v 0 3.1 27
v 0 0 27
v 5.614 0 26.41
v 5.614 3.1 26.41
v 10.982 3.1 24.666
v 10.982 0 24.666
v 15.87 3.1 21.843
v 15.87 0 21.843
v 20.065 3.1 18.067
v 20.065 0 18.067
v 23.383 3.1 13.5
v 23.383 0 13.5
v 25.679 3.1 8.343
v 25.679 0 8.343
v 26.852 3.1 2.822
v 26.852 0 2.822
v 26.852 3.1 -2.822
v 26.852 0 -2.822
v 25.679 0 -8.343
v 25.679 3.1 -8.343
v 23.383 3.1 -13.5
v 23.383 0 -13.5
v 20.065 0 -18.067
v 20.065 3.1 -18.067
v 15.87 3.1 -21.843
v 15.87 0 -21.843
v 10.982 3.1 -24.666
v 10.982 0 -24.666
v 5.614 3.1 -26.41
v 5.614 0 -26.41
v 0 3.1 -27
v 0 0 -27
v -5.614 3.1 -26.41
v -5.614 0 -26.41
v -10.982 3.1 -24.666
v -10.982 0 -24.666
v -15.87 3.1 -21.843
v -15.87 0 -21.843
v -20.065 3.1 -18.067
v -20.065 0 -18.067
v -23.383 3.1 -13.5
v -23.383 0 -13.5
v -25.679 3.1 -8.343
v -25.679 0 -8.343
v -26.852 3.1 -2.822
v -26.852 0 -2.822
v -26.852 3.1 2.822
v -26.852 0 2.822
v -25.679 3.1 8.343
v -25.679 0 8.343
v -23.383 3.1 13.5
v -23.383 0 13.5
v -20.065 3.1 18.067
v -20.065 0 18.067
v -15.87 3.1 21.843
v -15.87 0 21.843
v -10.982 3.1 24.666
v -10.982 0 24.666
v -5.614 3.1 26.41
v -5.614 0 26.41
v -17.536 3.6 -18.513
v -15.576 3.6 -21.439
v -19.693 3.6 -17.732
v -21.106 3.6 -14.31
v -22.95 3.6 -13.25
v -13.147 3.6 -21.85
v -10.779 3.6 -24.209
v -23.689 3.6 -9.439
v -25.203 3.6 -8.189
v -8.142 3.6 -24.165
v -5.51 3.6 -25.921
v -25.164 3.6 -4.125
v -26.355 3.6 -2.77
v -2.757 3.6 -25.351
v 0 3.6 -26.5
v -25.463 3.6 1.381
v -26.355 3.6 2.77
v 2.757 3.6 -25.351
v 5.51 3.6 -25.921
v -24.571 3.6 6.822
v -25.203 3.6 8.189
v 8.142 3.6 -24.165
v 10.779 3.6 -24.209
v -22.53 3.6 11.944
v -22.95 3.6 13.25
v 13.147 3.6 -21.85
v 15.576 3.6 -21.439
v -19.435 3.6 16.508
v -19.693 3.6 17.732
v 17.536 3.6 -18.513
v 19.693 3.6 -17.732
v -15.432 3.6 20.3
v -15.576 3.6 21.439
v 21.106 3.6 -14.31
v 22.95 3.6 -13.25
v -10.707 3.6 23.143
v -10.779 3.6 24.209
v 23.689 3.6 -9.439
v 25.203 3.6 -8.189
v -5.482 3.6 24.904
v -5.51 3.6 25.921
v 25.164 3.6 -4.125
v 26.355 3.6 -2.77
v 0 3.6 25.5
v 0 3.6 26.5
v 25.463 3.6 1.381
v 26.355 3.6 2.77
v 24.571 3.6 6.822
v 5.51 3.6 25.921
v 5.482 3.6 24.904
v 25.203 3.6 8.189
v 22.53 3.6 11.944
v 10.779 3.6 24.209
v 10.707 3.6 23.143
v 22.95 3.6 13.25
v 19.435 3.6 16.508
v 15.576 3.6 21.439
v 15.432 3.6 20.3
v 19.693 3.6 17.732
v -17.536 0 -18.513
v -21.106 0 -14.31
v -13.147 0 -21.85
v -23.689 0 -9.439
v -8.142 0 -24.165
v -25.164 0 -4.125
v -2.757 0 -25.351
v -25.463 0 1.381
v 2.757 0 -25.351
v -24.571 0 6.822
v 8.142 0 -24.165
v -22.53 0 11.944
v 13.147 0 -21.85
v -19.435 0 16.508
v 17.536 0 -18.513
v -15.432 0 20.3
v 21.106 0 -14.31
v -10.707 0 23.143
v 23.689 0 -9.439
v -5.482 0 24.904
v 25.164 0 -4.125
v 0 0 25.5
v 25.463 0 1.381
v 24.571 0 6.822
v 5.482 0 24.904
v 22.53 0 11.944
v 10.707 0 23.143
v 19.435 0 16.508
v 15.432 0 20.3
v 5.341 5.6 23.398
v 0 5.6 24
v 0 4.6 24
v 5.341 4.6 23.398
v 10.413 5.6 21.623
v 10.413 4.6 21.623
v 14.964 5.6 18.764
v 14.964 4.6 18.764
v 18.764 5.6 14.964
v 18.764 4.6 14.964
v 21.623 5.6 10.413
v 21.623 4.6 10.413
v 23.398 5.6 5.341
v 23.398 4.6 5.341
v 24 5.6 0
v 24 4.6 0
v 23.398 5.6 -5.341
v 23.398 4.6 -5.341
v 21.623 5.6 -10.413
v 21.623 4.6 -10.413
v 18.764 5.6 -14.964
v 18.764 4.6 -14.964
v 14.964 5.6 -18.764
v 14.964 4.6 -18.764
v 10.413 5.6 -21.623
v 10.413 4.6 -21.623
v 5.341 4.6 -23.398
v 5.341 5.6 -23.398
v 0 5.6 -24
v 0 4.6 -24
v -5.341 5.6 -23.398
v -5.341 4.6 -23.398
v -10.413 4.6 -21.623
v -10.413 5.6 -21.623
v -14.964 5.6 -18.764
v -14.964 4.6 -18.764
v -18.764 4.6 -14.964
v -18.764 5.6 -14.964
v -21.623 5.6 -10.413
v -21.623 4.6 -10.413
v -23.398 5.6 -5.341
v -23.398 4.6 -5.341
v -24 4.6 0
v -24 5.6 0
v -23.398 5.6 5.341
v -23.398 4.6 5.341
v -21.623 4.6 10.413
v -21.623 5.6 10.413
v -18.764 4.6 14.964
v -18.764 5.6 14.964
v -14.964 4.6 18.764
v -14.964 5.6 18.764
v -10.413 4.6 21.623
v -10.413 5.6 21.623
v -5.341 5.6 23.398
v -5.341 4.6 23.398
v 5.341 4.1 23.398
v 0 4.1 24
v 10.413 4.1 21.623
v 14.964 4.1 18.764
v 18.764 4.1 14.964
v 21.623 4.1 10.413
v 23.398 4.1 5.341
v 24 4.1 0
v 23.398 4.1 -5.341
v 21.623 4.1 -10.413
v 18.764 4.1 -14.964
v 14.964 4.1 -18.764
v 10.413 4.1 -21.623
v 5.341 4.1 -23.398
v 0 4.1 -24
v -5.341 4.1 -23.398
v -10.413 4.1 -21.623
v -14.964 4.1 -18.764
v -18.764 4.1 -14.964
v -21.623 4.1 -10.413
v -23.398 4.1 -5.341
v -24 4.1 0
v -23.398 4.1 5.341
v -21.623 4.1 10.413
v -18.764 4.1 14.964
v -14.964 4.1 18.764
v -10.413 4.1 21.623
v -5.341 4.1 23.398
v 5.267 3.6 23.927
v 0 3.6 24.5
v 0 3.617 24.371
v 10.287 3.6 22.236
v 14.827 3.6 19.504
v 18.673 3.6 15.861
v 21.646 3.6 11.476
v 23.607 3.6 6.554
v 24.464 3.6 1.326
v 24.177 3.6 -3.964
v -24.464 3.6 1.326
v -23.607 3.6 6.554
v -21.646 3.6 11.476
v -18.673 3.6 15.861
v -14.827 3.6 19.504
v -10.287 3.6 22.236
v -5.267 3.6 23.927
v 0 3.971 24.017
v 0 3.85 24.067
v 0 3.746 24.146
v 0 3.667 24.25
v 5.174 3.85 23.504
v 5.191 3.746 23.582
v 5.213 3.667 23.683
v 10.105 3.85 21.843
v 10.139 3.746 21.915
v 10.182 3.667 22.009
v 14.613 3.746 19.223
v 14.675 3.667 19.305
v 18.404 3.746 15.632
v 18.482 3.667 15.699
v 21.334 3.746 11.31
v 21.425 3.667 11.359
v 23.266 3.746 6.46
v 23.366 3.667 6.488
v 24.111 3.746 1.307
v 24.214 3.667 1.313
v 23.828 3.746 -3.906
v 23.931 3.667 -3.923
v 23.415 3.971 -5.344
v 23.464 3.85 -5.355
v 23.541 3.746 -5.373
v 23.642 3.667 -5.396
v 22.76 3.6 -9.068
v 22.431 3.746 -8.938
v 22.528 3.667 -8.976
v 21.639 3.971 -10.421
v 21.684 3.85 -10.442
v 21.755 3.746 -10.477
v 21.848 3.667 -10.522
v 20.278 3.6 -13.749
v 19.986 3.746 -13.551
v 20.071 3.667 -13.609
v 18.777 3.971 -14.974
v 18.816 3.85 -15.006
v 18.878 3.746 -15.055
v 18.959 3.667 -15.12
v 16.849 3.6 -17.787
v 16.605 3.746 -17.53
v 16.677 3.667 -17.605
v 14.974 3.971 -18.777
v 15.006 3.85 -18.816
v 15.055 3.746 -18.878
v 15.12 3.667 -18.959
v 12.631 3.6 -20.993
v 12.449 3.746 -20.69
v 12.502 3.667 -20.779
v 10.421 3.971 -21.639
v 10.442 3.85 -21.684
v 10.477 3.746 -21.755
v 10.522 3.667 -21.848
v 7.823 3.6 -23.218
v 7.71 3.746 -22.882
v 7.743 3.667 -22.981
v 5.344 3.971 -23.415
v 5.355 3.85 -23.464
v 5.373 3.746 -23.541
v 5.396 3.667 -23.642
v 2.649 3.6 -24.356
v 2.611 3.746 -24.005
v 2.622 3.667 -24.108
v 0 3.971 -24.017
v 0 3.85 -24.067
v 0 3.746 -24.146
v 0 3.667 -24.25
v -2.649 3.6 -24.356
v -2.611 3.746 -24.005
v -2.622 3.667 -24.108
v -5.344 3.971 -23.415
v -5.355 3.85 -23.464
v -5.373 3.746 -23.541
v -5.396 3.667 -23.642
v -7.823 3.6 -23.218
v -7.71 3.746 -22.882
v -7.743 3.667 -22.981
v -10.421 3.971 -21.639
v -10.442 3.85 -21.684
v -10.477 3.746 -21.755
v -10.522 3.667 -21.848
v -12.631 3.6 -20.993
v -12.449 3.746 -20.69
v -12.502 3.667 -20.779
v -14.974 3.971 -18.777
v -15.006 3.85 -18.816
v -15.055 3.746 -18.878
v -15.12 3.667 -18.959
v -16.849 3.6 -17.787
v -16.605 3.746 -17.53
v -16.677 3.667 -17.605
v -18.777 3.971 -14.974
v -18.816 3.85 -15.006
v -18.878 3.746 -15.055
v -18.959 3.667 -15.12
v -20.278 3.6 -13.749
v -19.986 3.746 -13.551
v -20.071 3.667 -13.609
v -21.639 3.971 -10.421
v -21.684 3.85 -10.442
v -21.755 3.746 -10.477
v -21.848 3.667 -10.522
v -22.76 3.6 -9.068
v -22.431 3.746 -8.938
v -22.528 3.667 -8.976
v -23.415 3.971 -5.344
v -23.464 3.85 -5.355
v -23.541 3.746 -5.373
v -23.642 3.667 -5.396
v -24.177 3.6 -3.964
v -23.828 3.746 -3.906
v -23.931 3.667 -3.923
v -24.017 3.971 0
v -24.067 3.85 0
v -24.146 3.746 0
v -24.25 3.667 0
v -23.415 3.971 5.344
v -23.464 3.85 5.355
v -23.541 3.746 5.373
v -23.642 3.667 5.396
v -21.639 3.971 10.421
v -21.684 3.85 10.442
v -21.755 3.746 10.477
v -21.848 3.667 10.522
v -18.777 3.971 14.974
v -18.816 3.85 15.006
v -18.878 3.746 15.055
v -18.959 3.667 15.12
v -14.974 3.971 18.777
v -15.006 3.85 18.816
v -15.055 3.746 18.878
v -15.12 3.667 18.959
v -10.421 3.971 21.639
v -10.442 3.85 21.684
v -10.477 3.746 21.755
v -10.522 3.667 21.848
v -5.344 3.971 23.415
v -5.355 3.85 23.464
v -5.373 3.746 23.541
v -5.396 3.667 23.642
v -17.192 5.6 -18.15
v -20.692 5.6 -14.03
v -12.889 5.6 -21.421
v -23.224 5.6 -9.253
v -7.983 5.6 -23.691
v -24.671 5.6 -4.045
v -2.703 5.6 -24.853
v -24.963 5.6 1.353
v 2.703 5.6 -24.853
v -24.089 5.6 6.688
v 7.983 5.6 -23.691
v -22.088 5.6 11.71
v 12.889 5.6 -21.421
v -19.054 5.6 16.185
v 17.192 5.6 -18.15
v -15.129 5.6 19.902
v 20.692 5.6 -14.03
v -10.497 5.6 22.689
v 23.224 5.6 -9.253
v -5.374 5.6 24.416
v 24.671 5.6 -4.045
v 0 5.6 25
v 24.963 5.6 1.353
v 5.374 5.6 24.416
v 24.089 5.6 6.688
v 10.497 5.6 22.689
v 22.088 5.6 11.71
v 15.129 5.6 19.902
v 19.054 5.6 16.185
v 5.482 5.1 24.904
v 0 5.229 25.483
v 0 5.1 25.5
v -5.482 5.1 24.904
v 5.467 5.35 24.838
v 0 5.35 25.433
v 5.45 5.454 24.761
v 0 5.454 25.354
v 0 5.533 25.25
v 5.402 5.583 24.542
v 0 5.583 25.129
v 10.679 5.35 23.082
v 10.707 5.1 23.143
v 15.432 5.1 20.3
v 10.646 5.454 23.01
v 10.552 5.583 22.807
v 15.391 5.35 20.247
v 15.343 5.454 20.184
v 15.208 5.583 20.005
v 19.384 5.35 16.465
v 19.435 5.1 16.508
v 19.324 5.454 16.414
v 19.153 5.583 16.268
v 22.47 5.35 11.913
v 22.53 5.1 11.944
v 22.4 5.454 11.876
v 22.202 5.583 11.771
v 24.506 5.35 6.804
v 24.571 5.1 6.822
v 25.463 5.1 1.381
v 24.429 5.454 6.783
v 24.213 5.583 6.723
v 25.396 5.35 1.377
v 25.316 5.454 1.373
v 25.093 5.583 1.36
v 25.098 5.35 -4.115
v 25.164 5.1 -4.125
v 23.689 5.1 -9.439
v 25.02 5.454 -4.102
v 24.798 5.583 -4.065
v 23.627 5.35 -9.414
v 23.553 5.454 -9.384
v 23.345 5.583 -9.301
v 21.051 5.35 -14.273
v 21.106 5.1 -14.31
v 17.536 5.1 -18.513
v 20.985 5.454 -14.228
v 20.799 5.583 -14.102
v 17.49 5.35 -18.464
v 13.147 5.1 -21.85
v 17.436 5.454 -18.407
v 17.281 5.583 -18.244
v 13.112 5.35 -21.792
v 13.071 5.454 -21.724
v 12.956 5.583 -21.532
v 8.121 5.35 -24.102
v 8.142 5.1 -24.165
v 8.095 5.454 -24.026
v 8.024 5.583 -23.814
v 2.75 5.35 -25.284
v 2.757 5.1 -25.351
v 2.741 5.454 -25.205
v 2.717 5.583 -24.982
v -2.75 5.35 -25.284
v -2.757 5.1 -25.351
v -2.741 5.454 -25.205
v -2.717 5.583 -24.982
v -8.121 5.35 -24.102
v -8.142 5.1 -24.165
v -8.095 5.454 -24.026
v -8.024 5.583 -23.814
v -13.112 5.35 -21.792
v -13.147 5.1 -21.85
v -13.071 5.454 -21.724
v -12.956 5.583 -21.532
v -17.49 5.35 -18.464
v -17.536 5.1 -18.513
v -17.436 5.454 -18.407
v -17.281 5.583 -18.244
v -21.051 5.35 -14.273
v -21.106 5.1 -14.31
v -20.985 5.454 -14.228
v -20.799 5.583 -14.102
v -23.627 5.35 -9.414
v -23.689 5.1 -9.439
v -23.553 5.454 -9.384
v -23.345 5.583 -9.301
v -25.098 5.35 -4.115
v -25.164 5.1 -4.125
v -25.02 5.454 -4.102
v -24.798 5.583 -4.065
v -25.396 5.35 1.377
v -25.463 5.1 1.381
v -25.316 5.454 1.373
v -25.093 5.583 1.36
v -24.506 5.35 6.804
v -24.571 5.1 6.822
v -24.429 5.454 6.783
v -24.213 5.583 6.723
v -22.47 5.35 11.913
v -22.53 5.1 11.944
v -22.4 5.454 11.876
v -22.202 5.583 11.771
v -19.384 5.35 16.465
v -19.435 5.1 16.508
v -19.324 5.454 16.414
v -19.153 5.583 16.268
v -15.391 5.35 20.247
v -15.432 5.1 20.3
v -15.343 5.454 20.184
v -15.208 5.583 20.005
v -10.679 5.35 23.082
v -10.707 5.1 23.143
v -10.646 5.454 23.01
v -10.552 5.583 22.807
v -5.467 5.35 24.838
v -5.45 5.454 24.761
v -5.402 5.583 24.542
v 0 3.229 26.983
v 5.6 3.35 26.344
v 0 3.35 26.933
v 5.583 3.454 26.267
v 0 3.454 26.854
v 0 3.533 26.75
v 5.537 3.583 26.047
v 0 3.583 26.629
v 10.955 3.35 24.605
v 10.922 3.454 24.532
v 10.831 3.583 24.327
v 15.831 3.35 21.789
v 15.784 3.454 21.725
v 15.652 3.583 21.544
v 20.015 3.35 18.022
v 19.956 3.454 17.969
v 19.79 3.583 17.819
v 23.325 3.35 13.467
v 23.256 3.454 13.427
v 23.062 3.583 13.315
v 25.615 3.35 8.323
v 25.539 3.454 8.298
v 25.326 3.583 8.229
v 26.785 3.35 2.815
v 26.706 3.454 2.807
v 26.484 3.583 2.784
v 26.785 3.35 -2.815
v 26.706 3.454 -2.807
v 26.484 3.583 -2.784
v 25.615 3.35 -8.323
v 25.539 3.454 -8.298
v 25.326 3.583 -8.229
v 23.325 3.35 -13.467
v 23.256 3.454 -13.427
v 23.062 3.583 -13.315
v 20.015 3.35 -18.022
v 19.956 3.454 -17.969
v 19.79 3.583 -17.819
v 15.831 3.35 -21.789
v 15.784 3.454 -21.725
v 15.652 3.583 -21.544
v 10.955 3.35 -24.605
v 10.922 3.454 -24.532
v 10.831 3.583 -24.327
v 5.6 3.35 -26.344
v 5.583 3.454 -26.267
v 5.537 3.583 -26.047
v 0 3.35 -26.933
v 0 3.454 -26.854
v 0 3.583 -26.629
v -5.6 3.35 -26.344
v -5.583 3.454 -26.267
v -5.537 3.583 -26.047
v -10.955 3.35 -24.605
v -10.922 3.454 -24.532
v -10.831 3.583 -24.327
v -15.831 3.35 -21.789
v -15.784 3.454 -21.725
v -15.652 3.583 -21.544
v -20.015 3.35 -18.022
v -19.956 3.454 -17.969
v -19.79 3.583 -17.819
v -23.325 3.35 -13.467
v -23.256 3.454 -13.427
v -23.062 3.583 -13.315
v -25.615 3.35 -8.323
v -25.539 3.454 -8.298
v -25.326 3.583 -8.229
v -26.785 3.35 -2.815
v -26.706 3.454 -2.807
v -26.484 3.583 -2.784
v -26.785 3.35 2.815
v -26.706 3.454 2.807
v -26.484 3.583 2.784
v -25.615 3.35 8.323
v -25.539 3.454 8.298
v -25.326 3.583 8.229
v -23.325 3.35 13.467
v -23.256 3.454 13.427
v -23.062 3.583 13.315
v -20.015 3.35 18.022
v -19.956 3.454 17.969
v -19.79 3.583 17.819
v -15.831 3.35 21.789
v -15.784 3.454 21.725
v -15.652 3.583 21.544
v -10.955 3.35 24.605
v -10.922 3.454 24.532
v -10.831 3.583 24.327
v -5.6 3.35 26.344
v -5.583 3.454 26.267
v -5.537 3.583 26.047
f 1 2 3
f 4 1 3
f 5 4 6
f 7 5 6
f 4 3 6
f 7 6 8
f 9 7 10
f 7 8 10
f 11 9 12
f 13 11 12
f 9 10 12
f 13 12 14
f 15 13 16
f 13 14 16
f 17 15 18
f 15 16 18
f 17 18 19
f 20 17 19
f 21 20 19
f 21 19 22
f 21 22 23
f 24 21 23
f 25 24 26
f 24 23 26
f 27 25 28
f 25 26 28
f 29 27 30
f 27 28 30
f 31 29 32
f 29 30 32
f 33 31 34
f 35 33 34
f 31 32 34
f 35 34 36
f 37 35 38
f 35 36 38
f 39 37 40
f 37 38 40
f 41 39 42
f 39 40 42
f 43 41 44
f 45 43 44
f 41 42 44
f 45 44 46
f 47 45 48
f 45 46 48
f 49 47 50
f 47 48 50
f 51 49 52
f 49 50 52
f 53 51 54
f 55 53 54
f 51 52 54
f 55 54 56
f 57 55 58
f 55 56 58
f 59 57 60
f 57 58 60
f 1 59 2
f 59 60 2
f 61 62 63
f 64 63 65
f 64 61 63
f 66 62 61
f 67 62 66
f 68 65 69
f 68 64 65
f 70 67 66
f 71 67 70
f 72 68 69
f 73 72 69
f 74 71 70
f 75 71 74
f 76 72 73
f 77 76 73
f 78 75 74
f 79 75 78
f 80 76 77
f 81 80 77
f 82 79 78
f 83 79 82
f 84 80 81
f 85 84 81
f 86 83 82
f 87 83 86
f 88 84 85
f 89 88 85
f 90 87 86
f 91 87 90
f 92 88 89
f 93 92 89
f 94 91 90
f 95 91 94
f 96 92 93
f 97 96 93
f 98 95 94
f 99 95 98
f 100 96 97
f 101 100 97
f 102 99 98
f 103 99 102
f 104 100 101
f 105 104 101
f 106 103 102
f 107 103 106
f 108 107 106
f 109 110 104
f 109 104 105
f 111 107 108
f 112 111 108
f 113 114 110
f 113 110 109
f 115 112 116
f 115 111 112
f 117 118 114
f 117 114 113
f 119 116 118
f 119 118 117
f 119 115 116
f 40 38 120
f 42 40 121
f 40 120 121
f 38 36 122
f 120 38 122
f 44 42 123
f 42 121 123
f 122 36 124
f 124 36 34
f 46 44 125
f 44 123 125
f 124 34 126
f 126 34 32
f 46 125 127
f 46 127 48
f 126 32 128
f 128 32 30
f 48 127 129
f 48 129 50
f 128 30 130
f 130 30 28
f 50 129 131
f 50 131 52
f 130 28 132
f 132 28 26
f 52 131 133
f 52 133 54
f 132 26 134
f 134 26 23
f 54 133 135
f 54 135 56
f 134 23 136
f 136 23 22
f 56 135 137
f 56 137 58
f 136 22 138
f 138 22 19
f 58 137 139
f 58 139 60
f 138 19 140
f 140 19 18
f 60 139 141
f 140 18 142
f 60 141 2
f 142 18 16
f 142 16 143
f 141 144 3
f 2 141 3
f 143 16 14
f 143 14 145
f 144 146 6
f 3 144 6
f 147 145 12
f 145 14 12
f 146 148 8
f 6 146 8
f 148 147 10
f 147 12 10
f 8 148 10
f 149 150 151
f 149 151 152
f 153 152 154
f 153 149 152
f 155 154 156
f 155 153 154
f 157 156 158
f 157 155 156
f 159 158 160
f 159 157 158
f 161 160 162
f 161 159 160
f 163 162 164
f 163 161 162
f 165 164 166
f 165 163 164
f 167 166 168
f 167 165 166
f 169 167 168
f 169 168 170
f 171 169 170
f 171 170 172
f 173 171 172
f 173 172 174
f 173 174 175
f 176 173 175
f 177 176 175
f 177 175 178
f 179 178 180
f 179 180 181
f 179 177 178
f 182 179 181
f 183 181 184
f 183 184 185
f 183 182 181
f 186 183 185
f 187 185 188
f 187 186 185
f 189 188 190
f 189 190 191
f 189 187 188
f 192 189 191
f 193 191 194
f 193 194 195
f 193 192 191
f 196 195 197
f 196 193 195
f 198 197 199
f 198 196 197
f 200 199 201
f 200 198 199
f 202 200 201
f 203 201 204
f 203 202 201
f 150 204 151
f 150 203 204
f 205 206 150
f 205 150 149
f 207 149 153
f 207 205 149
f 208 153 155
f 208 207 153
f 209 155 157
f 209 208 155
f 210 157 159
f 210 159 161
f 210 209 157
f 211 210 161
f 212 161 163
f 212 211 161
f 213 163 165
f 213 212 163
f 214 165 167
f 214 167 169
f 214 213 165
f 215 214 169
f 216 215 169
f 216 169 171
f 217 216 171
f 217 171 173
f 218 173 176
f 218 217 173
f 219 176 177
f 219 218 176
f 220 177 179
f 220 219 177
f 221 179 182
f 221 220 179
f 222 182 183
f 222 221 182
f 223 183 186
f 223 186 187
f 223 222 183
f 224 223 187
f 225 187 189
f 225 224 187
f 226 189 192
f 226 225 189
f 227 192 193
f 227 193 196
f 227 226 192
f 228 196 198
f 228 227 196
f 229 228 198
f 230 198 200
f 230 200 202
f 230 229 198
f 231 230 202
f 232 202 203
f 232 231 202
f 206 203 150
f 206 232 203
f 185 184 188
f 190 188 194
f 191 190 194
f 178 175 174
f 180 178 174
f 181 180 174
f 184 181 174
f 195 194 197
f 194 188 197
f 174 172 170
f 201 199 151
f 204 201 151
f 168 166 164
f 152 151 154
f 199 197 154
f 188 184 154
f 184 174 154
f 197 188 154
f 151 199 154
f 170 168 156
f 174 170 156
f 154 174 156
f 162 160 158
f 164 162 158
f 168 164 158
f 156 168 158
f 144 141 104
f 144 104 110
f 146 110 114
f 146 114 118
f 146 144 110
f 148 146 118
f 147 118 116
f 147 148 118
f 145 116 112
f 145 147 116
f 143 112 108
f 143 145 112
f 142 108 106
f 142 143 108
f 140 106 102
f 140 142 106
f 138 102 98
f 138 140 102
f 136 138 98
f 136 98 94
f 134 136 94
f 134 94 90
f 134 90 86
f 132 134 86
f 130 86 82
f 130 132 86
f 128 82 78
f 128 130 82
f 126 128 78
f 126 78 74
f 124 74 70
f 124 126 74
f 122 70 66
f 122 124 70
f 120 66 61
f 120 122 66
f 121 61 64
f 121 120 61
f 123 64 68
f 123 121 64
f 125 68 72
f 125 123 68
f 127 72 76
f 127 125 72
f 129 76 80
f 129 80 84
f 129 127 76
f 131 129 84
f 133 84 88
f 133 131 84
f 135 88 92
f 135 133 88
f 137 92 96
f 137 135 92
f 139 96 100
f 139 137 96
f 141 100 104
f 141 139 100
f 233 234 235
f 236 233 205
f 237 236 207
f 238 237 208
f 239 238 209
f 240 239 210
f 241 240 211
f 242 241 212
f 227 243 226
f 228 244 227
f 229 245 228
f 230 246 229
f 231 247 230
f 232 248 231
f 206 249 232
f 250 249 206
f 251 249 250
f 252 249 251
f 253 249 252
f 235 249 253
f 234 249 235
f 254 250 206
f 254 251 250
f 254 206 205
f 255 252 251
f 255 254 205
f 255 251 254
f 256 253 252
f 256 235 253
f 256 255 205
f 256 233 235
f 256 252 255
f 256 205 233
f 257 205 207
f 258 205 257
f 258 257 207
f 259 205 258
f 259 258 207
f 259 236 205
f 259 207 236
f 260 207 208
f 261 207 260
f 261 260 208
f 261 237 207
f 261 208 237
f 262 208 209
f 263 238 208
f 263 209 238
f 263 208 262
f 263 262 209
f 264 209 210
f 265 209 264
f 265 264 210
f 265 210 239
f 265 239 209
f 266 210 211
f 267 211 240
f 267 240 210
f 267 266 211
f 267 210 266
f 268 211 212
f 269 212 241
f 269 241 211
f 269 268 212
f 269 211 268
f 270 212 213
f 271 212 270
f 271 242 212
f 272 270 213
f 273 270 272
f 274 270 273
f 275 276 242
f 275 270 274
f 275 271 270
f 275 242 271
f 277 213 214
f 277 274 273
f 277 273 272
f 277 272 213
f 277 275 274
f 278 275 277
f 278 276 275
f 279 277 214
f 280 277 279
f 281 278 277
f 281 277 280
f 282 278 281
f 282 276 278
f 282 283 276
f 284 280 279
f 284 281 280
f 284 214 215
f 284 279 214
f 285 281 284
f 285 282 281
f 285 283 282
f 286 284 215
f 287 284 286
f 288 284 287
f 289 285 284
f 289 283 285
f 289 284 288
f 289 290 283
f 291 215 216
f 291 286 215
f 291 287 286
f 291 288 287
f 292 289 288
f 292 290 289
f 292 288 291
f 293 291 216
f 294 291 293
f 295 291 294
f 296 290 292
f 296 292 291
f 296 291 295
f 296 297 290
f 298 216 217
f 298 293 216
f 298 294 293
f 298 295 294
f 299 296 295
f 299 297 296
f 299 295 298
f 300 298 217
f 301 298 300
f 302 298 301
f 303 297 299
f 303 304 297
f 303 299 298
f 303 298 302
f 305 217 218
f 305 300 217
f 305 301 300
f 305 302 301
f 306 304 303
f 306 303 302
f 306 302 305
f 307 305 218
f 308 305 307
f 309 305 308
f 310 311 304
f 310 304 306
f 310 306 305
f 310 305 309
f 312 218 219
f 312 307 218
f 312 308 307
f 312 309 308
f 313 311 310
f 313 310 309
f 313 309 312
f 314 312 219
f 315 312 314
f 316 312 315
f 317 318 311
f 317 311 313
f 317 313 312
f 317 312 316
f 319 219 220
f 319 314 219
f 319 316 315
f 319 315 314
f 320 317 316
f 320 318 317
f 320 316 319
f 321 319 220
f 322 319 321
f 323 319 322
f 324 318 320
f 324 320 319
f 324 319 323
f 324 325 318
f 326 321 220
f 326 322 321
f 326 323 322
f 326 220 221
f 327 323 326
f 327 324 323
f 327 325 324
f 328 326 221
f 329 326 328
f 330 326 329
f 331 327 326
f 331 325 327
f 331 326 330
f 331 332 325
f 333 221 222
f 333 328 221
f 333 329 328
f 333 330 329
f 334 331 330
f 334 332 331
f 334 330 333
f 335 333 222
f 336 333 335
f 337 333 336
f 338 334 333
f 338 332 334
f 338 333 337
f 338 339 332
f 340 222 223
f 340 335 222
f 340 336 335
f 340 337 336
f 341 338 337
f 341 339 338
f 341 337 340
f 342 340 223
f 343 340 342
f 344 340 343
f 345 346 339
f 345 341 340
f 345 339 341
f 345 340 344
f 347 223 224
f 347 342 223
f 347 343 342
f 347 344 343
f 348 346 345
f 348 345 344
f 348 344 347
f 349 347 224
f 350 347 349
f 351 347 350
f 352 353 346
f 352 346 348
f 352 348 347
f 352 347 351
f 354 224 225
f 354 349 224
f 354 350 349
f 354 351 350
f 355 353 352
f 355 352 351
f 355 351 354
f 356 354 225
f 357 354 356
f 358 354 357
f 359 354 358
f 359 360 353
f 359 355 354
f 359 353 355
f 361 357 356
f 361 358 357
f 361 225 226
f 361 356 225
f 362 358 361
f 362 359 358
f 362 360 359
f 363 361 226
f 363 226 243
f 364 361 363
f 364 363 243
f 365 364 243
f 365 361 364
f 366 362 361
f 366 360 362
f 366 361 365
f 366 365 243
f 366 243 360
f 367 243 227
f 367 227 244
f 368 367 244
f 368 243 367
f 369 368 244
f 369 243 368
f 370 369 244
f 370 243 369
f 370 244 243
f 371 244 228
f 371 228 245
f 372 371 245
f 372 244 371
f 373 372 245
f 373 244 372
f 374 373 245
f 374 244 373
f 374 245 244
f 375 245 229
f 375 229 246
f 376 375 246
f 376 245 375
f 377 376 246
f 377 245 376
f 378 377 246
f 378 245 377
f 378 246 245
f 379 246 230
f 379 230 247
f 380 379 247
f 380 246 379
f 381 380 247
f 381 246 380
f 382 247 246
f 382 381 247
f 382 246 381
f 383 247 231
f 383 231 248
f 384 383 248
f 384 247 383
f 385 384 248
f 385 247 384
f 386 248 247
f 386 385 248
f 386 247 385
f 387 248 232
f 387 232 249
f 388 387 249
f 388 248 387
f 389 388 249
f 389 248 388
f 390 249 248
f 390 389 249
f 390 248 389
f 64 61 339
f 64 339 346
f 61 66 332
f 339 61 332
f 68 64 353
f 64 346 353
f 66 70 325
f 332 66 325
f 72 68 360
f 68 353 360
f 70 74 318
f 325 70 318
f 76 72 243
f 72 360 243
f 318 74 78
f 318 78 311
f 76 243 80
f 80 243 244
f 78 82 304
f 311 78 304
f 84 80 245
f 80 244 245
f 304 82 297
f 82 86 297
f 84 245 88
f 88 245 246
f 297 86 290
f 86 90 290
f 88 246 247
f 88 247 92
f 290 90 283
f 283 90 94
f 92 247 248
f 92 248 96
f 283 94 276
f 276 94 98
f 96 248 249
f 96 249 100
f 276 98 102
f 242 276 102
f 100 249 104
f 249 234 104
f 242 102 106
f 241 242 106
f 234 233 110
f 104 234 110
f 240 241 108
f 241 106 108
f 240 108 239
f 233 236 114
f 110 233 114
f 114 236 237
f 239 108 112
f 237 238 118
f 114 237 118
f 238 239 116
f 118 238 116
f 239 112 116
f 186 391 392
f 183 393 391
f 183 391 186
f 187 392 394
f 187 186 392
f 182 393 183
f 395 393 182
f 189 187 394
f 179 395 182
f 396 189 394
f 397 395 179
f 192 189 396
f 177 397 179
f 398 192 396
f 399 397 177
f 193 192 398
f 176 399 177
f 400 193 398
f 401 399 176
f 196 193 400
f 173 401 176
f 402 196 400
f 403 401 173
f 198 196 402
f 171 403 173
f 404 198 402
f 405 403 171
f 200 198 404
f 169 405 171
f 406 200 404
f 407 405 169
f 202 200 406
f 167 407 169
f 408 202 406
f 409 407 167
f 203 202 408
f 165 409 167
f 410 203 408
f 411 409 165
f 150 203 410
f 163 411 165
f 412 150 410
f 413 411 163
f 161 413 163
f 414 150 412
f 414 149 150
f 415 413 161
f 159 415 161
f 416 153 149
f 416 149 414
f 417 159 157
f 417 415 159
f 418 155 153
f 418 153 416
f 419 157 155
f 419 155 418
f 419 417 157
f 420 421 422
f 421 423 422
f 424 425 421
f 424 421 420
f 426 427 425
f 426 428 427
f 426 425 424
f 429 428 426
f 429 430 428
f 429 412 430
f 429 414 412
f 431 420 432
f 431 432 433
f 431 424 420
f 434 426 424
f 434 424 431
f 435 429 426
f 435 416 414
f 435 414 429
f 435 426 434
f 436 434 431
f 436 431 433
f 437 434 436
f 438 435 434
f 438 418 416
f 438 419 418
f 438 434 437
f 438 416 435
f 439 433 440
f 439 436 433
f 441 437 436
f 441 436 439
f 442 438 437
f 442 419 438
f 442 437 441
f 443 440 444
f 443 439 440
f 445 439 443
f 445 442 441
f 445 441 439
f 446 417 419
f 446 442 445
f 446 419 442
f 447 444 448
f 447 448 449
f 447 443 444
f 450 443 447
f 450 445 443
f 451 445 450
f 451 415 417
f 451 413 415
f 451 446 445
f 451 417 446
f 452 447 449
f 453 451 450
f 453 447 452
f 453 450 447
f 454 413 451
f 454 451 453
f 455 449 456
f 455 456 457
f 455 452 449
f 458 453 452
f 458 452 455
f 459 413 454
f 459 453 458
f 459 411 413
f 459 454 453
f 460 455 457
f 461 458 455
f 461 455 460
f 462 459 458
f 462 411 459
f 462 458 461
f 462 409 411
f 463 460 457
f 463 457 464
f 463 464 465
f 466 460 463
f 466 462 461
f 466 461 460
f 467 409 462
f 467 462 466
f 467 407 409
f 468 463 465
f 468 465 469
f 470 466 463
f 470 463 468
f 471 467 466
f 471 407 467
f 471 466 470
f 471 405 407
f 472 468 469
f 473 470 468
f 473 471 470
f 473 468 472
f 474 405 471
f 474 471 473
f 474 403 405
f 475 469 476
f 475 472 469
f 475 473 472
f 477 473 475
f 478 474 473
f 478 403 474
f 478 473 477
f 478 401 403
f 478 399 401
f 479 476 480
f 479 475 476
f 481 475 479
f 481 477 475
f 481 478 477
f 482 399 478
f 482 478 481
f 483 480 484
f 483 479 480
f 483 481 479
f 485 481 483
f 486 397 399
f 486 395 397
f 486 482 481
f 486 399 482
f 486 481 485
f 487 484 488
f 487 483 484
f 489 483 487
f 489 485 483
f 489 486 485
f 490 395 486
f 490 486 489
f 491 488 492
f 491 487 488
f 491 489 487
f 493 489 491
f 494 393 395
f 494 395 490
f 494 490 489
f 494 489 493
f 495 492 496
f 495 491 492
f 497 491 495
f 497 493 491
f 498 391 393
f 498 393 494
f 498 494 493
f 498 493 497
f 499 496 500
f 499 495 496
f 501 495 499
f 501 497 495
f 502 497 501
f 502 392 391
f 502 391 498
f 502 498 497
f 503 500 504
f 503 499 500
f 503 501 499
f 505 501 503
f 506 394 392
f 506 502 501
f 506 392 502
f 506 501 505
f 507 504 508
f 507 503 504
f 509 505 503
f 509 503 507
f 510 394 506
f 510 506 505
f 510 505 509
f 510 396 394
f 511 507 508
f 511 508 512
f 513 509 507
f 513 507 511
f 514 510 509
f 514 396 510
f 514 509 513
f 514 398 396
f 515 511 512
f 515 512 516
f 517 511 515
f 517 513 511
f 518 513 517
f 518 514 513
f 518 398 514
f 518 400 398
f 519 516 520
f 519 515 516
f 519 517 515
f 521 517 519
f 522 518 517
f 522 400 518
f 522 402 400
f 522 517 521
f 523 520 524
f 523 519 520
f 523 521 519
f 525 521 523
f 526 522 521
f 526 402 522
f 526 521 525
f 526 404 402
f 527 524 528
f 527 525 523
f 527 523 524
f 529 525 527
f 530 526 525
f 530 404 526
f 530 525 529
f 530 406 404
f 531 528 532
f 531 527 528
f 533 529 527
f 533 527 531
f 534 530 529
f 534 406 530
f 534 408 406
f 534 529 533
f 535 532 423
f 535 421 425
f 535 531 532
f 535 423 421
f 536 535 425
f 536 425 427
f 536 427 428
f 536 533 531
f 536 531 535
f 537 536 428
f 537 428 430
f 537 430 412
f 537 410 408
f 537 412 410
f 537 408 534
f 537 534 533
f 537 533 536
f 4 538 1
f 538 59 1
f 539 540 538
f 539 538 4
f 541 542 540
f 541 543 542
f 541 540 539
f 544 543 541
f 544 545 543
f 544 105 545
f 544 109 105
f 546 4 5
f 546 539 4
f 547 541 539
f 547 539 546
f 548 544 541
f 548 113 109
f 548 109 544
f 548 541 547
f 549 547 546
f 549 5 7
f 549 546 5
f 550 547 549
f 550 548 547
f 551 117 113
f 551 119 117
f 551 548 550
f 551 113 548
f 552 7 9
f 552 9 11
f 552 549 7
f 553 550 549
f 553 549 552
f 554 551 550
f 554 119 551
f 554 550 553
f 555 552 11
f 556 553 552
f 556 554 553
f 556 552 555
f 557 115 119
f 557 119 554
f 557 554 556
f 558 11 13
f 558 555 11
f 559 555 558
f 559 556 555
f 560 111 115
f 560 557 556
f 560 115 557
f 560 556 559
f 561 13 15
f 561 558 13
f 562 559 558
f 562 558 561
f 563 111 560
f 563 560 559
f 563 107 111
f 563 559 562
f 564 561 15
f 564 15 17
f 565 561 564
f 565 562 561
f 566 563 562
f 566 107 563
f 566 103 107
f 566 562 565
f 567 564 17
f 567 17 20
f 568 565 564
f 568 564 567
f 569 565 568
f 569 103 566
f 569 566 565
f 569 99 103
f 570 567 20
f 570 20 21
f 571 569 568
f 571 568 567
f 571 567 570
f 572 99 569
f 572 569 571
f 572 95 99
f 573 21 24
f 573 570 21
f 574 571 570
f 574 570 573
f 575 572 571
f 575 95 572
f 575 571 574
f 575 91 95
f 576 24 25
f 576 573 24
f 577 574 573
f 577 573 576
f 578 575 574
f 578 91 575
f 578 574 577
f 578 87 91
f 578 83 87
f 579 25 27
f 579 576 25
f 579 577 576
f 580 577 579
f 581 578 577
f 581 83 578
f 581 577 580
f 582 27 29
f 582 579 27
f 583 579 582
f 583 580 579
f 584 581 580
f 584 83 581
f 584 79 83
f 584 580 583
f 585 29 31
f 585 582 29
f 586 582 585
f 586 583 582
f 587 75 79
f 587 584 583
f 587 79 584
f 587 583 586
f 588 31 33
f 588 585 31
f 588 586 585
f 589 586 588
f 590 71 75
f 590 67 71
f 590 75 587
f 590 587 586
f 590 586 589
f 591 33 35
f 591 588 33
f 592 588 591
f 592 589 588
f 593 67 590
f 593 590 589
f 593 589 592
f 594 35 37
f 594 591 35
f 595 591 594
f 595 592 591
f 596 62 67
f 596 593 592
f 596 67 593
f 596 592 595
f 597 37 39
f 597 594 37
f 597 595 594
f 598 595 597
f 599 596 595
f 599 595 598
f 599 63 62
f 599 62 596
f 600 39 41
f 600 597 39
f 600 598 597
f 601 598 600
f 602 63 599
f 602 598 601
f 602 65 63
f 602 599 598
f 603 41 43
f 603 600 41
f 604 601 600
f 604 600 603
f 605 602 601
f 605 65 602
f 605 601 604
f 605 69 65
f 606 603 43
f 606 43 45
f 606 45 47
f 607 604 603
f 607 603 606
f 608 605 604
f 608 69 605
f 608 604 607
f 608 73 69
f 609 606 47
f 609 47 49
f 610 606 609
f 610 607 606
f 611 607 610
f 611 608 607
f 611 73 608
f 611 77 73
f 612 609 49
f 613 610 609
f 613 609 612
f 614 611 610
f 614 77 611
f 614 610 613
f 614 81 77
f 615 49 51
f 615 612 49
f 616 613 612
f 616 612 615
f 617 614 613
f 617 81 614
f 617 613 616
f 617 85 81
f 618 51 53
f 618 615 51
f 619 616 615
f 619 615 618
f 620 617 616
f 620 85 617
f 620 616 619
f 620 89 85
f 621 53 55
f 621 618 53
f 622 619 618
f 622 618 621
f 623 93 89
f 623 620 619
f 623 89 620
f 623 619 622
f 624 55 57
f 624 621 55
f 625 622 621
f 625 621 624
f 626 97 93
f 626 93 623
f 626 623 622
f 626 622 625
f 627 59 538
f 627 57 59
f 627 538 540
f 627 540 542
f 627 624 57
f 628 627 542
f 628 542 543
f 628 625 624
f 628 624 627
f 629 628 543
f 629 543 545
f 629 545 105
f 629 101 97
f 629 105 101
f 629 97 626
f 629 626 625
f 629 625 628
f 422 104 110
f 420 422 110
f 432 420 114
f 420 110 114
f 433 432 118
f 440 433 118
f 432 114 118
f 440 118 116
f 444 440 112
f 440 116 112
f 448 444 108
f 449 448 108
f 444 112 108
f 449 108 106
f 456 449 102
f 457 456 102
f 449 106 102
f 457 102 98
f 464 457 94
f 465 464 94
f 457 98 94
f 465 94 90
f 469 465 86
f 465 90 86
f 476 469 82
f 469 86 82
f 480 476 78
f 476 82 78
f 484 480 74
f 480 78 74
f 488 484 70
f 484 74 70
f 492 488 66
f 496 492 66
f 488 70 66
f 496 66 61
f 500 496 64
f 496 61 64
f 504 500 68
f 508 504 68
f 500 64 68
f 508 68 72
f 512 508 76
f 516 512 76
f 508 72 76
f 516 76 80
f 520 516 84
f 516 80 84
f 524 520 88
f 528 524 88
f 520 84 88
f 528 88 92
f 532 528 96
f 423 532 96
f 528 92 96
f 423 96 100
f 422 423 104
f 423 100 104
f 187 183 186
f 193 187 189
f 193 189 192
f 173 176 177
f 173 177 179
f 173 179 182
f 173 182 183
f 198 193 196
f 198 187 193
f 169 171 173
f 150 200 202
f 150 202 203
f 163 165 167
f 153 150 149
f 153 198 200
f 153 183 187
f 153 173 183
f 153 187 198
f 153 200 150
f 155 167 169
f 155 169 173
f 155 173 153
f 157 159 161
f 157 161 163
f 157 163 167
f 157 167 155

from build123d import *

# Parameters (mm, degrees)
SKETCH1_R           = 27
SKETCH1_R_2         = 25.5
BOSS_EXTRUDE1_DEPTH = 3.6
SKETCH2_R           = 25.5
SKETCH2_R_2         = 24
BOSS_EXTRUDE2_DEPTH = 2
FILLET2_R           = 0.5
FILLET4_R           = 0.5
SKETCH3_R           = 24
BOSS_EXTRUDE4_DEPTH = 1


with BuildPart() as part:
    # Sketch1 → Boss-Extrude1 (new body)
    with BuildSketch(Plane(origin=(0, 0, 0), x_dir=(1, 0, 0), z_dir=(0, 1, 0))):
        with Locations(Location((0, 0, 0), (0, 0, 270))):
            Circle(SKETCH1_R)
        with Locations(Location((0, 0, 0), (0, 0, 270))):
            Circle(SKETCH1_R_2, mode=Mode.SUBTRACT)
    extrude(amount=BOSS_EXTRUDE1_DEPTH)

    # Fillet4
    fillet4_edges = [part.edges().sort_by_distance(p)[0] for p in [
        (0, 3.6, -27),
    ]]
    fillet(fillet4_edges, radius=FILLET4_R)


with BuildPart() as body_2:
    # Sketch2 → Boss-Extrude2 (new body)
    with BuildSketch(Plane(origin=(0, 3.6, 0), x_dir=(1, 0, 0), z_dir=(0, 1, 0))):
        with Locations(Location((0, 0, 0), (0, 0, 270))):
            Circle(SKETCH2_R)
        with Locations(Location((0, 0, 0), (0, 0, 270))):
            Circle(SKETCH2_R_2, mode=Mode.SUBTRACT)
    extrude(amount=BOSS_EXTRUDE2_DEPTH)

    # Fillet2
    fillet2_edges = [body_2.edges().sort_by_distance(p)[0] for p in [
        (0, 5.6, -25.5),
        (0, 3.6, -24),
    ]]
    fillet(fillet2_edges, radius=FILLET2_R)


with BuildPart() as body_3:
    # Sketch3 → Boss-Extrude4 (new body)
    with BuildSketch(Plane(origin=(0, 5.6, 0), x_dir=(1, 0, 0), z_dir=(0, 1, 0))):
        with Locations(Location((0, 0, 0), (0, 0, 270))):
            Circle(SKETCH3_R)
    extrude(amount=-BOSS_EXTRUDE4_DEPTH)


solid = Compound([part.part, body_2.part, body_3.part])
